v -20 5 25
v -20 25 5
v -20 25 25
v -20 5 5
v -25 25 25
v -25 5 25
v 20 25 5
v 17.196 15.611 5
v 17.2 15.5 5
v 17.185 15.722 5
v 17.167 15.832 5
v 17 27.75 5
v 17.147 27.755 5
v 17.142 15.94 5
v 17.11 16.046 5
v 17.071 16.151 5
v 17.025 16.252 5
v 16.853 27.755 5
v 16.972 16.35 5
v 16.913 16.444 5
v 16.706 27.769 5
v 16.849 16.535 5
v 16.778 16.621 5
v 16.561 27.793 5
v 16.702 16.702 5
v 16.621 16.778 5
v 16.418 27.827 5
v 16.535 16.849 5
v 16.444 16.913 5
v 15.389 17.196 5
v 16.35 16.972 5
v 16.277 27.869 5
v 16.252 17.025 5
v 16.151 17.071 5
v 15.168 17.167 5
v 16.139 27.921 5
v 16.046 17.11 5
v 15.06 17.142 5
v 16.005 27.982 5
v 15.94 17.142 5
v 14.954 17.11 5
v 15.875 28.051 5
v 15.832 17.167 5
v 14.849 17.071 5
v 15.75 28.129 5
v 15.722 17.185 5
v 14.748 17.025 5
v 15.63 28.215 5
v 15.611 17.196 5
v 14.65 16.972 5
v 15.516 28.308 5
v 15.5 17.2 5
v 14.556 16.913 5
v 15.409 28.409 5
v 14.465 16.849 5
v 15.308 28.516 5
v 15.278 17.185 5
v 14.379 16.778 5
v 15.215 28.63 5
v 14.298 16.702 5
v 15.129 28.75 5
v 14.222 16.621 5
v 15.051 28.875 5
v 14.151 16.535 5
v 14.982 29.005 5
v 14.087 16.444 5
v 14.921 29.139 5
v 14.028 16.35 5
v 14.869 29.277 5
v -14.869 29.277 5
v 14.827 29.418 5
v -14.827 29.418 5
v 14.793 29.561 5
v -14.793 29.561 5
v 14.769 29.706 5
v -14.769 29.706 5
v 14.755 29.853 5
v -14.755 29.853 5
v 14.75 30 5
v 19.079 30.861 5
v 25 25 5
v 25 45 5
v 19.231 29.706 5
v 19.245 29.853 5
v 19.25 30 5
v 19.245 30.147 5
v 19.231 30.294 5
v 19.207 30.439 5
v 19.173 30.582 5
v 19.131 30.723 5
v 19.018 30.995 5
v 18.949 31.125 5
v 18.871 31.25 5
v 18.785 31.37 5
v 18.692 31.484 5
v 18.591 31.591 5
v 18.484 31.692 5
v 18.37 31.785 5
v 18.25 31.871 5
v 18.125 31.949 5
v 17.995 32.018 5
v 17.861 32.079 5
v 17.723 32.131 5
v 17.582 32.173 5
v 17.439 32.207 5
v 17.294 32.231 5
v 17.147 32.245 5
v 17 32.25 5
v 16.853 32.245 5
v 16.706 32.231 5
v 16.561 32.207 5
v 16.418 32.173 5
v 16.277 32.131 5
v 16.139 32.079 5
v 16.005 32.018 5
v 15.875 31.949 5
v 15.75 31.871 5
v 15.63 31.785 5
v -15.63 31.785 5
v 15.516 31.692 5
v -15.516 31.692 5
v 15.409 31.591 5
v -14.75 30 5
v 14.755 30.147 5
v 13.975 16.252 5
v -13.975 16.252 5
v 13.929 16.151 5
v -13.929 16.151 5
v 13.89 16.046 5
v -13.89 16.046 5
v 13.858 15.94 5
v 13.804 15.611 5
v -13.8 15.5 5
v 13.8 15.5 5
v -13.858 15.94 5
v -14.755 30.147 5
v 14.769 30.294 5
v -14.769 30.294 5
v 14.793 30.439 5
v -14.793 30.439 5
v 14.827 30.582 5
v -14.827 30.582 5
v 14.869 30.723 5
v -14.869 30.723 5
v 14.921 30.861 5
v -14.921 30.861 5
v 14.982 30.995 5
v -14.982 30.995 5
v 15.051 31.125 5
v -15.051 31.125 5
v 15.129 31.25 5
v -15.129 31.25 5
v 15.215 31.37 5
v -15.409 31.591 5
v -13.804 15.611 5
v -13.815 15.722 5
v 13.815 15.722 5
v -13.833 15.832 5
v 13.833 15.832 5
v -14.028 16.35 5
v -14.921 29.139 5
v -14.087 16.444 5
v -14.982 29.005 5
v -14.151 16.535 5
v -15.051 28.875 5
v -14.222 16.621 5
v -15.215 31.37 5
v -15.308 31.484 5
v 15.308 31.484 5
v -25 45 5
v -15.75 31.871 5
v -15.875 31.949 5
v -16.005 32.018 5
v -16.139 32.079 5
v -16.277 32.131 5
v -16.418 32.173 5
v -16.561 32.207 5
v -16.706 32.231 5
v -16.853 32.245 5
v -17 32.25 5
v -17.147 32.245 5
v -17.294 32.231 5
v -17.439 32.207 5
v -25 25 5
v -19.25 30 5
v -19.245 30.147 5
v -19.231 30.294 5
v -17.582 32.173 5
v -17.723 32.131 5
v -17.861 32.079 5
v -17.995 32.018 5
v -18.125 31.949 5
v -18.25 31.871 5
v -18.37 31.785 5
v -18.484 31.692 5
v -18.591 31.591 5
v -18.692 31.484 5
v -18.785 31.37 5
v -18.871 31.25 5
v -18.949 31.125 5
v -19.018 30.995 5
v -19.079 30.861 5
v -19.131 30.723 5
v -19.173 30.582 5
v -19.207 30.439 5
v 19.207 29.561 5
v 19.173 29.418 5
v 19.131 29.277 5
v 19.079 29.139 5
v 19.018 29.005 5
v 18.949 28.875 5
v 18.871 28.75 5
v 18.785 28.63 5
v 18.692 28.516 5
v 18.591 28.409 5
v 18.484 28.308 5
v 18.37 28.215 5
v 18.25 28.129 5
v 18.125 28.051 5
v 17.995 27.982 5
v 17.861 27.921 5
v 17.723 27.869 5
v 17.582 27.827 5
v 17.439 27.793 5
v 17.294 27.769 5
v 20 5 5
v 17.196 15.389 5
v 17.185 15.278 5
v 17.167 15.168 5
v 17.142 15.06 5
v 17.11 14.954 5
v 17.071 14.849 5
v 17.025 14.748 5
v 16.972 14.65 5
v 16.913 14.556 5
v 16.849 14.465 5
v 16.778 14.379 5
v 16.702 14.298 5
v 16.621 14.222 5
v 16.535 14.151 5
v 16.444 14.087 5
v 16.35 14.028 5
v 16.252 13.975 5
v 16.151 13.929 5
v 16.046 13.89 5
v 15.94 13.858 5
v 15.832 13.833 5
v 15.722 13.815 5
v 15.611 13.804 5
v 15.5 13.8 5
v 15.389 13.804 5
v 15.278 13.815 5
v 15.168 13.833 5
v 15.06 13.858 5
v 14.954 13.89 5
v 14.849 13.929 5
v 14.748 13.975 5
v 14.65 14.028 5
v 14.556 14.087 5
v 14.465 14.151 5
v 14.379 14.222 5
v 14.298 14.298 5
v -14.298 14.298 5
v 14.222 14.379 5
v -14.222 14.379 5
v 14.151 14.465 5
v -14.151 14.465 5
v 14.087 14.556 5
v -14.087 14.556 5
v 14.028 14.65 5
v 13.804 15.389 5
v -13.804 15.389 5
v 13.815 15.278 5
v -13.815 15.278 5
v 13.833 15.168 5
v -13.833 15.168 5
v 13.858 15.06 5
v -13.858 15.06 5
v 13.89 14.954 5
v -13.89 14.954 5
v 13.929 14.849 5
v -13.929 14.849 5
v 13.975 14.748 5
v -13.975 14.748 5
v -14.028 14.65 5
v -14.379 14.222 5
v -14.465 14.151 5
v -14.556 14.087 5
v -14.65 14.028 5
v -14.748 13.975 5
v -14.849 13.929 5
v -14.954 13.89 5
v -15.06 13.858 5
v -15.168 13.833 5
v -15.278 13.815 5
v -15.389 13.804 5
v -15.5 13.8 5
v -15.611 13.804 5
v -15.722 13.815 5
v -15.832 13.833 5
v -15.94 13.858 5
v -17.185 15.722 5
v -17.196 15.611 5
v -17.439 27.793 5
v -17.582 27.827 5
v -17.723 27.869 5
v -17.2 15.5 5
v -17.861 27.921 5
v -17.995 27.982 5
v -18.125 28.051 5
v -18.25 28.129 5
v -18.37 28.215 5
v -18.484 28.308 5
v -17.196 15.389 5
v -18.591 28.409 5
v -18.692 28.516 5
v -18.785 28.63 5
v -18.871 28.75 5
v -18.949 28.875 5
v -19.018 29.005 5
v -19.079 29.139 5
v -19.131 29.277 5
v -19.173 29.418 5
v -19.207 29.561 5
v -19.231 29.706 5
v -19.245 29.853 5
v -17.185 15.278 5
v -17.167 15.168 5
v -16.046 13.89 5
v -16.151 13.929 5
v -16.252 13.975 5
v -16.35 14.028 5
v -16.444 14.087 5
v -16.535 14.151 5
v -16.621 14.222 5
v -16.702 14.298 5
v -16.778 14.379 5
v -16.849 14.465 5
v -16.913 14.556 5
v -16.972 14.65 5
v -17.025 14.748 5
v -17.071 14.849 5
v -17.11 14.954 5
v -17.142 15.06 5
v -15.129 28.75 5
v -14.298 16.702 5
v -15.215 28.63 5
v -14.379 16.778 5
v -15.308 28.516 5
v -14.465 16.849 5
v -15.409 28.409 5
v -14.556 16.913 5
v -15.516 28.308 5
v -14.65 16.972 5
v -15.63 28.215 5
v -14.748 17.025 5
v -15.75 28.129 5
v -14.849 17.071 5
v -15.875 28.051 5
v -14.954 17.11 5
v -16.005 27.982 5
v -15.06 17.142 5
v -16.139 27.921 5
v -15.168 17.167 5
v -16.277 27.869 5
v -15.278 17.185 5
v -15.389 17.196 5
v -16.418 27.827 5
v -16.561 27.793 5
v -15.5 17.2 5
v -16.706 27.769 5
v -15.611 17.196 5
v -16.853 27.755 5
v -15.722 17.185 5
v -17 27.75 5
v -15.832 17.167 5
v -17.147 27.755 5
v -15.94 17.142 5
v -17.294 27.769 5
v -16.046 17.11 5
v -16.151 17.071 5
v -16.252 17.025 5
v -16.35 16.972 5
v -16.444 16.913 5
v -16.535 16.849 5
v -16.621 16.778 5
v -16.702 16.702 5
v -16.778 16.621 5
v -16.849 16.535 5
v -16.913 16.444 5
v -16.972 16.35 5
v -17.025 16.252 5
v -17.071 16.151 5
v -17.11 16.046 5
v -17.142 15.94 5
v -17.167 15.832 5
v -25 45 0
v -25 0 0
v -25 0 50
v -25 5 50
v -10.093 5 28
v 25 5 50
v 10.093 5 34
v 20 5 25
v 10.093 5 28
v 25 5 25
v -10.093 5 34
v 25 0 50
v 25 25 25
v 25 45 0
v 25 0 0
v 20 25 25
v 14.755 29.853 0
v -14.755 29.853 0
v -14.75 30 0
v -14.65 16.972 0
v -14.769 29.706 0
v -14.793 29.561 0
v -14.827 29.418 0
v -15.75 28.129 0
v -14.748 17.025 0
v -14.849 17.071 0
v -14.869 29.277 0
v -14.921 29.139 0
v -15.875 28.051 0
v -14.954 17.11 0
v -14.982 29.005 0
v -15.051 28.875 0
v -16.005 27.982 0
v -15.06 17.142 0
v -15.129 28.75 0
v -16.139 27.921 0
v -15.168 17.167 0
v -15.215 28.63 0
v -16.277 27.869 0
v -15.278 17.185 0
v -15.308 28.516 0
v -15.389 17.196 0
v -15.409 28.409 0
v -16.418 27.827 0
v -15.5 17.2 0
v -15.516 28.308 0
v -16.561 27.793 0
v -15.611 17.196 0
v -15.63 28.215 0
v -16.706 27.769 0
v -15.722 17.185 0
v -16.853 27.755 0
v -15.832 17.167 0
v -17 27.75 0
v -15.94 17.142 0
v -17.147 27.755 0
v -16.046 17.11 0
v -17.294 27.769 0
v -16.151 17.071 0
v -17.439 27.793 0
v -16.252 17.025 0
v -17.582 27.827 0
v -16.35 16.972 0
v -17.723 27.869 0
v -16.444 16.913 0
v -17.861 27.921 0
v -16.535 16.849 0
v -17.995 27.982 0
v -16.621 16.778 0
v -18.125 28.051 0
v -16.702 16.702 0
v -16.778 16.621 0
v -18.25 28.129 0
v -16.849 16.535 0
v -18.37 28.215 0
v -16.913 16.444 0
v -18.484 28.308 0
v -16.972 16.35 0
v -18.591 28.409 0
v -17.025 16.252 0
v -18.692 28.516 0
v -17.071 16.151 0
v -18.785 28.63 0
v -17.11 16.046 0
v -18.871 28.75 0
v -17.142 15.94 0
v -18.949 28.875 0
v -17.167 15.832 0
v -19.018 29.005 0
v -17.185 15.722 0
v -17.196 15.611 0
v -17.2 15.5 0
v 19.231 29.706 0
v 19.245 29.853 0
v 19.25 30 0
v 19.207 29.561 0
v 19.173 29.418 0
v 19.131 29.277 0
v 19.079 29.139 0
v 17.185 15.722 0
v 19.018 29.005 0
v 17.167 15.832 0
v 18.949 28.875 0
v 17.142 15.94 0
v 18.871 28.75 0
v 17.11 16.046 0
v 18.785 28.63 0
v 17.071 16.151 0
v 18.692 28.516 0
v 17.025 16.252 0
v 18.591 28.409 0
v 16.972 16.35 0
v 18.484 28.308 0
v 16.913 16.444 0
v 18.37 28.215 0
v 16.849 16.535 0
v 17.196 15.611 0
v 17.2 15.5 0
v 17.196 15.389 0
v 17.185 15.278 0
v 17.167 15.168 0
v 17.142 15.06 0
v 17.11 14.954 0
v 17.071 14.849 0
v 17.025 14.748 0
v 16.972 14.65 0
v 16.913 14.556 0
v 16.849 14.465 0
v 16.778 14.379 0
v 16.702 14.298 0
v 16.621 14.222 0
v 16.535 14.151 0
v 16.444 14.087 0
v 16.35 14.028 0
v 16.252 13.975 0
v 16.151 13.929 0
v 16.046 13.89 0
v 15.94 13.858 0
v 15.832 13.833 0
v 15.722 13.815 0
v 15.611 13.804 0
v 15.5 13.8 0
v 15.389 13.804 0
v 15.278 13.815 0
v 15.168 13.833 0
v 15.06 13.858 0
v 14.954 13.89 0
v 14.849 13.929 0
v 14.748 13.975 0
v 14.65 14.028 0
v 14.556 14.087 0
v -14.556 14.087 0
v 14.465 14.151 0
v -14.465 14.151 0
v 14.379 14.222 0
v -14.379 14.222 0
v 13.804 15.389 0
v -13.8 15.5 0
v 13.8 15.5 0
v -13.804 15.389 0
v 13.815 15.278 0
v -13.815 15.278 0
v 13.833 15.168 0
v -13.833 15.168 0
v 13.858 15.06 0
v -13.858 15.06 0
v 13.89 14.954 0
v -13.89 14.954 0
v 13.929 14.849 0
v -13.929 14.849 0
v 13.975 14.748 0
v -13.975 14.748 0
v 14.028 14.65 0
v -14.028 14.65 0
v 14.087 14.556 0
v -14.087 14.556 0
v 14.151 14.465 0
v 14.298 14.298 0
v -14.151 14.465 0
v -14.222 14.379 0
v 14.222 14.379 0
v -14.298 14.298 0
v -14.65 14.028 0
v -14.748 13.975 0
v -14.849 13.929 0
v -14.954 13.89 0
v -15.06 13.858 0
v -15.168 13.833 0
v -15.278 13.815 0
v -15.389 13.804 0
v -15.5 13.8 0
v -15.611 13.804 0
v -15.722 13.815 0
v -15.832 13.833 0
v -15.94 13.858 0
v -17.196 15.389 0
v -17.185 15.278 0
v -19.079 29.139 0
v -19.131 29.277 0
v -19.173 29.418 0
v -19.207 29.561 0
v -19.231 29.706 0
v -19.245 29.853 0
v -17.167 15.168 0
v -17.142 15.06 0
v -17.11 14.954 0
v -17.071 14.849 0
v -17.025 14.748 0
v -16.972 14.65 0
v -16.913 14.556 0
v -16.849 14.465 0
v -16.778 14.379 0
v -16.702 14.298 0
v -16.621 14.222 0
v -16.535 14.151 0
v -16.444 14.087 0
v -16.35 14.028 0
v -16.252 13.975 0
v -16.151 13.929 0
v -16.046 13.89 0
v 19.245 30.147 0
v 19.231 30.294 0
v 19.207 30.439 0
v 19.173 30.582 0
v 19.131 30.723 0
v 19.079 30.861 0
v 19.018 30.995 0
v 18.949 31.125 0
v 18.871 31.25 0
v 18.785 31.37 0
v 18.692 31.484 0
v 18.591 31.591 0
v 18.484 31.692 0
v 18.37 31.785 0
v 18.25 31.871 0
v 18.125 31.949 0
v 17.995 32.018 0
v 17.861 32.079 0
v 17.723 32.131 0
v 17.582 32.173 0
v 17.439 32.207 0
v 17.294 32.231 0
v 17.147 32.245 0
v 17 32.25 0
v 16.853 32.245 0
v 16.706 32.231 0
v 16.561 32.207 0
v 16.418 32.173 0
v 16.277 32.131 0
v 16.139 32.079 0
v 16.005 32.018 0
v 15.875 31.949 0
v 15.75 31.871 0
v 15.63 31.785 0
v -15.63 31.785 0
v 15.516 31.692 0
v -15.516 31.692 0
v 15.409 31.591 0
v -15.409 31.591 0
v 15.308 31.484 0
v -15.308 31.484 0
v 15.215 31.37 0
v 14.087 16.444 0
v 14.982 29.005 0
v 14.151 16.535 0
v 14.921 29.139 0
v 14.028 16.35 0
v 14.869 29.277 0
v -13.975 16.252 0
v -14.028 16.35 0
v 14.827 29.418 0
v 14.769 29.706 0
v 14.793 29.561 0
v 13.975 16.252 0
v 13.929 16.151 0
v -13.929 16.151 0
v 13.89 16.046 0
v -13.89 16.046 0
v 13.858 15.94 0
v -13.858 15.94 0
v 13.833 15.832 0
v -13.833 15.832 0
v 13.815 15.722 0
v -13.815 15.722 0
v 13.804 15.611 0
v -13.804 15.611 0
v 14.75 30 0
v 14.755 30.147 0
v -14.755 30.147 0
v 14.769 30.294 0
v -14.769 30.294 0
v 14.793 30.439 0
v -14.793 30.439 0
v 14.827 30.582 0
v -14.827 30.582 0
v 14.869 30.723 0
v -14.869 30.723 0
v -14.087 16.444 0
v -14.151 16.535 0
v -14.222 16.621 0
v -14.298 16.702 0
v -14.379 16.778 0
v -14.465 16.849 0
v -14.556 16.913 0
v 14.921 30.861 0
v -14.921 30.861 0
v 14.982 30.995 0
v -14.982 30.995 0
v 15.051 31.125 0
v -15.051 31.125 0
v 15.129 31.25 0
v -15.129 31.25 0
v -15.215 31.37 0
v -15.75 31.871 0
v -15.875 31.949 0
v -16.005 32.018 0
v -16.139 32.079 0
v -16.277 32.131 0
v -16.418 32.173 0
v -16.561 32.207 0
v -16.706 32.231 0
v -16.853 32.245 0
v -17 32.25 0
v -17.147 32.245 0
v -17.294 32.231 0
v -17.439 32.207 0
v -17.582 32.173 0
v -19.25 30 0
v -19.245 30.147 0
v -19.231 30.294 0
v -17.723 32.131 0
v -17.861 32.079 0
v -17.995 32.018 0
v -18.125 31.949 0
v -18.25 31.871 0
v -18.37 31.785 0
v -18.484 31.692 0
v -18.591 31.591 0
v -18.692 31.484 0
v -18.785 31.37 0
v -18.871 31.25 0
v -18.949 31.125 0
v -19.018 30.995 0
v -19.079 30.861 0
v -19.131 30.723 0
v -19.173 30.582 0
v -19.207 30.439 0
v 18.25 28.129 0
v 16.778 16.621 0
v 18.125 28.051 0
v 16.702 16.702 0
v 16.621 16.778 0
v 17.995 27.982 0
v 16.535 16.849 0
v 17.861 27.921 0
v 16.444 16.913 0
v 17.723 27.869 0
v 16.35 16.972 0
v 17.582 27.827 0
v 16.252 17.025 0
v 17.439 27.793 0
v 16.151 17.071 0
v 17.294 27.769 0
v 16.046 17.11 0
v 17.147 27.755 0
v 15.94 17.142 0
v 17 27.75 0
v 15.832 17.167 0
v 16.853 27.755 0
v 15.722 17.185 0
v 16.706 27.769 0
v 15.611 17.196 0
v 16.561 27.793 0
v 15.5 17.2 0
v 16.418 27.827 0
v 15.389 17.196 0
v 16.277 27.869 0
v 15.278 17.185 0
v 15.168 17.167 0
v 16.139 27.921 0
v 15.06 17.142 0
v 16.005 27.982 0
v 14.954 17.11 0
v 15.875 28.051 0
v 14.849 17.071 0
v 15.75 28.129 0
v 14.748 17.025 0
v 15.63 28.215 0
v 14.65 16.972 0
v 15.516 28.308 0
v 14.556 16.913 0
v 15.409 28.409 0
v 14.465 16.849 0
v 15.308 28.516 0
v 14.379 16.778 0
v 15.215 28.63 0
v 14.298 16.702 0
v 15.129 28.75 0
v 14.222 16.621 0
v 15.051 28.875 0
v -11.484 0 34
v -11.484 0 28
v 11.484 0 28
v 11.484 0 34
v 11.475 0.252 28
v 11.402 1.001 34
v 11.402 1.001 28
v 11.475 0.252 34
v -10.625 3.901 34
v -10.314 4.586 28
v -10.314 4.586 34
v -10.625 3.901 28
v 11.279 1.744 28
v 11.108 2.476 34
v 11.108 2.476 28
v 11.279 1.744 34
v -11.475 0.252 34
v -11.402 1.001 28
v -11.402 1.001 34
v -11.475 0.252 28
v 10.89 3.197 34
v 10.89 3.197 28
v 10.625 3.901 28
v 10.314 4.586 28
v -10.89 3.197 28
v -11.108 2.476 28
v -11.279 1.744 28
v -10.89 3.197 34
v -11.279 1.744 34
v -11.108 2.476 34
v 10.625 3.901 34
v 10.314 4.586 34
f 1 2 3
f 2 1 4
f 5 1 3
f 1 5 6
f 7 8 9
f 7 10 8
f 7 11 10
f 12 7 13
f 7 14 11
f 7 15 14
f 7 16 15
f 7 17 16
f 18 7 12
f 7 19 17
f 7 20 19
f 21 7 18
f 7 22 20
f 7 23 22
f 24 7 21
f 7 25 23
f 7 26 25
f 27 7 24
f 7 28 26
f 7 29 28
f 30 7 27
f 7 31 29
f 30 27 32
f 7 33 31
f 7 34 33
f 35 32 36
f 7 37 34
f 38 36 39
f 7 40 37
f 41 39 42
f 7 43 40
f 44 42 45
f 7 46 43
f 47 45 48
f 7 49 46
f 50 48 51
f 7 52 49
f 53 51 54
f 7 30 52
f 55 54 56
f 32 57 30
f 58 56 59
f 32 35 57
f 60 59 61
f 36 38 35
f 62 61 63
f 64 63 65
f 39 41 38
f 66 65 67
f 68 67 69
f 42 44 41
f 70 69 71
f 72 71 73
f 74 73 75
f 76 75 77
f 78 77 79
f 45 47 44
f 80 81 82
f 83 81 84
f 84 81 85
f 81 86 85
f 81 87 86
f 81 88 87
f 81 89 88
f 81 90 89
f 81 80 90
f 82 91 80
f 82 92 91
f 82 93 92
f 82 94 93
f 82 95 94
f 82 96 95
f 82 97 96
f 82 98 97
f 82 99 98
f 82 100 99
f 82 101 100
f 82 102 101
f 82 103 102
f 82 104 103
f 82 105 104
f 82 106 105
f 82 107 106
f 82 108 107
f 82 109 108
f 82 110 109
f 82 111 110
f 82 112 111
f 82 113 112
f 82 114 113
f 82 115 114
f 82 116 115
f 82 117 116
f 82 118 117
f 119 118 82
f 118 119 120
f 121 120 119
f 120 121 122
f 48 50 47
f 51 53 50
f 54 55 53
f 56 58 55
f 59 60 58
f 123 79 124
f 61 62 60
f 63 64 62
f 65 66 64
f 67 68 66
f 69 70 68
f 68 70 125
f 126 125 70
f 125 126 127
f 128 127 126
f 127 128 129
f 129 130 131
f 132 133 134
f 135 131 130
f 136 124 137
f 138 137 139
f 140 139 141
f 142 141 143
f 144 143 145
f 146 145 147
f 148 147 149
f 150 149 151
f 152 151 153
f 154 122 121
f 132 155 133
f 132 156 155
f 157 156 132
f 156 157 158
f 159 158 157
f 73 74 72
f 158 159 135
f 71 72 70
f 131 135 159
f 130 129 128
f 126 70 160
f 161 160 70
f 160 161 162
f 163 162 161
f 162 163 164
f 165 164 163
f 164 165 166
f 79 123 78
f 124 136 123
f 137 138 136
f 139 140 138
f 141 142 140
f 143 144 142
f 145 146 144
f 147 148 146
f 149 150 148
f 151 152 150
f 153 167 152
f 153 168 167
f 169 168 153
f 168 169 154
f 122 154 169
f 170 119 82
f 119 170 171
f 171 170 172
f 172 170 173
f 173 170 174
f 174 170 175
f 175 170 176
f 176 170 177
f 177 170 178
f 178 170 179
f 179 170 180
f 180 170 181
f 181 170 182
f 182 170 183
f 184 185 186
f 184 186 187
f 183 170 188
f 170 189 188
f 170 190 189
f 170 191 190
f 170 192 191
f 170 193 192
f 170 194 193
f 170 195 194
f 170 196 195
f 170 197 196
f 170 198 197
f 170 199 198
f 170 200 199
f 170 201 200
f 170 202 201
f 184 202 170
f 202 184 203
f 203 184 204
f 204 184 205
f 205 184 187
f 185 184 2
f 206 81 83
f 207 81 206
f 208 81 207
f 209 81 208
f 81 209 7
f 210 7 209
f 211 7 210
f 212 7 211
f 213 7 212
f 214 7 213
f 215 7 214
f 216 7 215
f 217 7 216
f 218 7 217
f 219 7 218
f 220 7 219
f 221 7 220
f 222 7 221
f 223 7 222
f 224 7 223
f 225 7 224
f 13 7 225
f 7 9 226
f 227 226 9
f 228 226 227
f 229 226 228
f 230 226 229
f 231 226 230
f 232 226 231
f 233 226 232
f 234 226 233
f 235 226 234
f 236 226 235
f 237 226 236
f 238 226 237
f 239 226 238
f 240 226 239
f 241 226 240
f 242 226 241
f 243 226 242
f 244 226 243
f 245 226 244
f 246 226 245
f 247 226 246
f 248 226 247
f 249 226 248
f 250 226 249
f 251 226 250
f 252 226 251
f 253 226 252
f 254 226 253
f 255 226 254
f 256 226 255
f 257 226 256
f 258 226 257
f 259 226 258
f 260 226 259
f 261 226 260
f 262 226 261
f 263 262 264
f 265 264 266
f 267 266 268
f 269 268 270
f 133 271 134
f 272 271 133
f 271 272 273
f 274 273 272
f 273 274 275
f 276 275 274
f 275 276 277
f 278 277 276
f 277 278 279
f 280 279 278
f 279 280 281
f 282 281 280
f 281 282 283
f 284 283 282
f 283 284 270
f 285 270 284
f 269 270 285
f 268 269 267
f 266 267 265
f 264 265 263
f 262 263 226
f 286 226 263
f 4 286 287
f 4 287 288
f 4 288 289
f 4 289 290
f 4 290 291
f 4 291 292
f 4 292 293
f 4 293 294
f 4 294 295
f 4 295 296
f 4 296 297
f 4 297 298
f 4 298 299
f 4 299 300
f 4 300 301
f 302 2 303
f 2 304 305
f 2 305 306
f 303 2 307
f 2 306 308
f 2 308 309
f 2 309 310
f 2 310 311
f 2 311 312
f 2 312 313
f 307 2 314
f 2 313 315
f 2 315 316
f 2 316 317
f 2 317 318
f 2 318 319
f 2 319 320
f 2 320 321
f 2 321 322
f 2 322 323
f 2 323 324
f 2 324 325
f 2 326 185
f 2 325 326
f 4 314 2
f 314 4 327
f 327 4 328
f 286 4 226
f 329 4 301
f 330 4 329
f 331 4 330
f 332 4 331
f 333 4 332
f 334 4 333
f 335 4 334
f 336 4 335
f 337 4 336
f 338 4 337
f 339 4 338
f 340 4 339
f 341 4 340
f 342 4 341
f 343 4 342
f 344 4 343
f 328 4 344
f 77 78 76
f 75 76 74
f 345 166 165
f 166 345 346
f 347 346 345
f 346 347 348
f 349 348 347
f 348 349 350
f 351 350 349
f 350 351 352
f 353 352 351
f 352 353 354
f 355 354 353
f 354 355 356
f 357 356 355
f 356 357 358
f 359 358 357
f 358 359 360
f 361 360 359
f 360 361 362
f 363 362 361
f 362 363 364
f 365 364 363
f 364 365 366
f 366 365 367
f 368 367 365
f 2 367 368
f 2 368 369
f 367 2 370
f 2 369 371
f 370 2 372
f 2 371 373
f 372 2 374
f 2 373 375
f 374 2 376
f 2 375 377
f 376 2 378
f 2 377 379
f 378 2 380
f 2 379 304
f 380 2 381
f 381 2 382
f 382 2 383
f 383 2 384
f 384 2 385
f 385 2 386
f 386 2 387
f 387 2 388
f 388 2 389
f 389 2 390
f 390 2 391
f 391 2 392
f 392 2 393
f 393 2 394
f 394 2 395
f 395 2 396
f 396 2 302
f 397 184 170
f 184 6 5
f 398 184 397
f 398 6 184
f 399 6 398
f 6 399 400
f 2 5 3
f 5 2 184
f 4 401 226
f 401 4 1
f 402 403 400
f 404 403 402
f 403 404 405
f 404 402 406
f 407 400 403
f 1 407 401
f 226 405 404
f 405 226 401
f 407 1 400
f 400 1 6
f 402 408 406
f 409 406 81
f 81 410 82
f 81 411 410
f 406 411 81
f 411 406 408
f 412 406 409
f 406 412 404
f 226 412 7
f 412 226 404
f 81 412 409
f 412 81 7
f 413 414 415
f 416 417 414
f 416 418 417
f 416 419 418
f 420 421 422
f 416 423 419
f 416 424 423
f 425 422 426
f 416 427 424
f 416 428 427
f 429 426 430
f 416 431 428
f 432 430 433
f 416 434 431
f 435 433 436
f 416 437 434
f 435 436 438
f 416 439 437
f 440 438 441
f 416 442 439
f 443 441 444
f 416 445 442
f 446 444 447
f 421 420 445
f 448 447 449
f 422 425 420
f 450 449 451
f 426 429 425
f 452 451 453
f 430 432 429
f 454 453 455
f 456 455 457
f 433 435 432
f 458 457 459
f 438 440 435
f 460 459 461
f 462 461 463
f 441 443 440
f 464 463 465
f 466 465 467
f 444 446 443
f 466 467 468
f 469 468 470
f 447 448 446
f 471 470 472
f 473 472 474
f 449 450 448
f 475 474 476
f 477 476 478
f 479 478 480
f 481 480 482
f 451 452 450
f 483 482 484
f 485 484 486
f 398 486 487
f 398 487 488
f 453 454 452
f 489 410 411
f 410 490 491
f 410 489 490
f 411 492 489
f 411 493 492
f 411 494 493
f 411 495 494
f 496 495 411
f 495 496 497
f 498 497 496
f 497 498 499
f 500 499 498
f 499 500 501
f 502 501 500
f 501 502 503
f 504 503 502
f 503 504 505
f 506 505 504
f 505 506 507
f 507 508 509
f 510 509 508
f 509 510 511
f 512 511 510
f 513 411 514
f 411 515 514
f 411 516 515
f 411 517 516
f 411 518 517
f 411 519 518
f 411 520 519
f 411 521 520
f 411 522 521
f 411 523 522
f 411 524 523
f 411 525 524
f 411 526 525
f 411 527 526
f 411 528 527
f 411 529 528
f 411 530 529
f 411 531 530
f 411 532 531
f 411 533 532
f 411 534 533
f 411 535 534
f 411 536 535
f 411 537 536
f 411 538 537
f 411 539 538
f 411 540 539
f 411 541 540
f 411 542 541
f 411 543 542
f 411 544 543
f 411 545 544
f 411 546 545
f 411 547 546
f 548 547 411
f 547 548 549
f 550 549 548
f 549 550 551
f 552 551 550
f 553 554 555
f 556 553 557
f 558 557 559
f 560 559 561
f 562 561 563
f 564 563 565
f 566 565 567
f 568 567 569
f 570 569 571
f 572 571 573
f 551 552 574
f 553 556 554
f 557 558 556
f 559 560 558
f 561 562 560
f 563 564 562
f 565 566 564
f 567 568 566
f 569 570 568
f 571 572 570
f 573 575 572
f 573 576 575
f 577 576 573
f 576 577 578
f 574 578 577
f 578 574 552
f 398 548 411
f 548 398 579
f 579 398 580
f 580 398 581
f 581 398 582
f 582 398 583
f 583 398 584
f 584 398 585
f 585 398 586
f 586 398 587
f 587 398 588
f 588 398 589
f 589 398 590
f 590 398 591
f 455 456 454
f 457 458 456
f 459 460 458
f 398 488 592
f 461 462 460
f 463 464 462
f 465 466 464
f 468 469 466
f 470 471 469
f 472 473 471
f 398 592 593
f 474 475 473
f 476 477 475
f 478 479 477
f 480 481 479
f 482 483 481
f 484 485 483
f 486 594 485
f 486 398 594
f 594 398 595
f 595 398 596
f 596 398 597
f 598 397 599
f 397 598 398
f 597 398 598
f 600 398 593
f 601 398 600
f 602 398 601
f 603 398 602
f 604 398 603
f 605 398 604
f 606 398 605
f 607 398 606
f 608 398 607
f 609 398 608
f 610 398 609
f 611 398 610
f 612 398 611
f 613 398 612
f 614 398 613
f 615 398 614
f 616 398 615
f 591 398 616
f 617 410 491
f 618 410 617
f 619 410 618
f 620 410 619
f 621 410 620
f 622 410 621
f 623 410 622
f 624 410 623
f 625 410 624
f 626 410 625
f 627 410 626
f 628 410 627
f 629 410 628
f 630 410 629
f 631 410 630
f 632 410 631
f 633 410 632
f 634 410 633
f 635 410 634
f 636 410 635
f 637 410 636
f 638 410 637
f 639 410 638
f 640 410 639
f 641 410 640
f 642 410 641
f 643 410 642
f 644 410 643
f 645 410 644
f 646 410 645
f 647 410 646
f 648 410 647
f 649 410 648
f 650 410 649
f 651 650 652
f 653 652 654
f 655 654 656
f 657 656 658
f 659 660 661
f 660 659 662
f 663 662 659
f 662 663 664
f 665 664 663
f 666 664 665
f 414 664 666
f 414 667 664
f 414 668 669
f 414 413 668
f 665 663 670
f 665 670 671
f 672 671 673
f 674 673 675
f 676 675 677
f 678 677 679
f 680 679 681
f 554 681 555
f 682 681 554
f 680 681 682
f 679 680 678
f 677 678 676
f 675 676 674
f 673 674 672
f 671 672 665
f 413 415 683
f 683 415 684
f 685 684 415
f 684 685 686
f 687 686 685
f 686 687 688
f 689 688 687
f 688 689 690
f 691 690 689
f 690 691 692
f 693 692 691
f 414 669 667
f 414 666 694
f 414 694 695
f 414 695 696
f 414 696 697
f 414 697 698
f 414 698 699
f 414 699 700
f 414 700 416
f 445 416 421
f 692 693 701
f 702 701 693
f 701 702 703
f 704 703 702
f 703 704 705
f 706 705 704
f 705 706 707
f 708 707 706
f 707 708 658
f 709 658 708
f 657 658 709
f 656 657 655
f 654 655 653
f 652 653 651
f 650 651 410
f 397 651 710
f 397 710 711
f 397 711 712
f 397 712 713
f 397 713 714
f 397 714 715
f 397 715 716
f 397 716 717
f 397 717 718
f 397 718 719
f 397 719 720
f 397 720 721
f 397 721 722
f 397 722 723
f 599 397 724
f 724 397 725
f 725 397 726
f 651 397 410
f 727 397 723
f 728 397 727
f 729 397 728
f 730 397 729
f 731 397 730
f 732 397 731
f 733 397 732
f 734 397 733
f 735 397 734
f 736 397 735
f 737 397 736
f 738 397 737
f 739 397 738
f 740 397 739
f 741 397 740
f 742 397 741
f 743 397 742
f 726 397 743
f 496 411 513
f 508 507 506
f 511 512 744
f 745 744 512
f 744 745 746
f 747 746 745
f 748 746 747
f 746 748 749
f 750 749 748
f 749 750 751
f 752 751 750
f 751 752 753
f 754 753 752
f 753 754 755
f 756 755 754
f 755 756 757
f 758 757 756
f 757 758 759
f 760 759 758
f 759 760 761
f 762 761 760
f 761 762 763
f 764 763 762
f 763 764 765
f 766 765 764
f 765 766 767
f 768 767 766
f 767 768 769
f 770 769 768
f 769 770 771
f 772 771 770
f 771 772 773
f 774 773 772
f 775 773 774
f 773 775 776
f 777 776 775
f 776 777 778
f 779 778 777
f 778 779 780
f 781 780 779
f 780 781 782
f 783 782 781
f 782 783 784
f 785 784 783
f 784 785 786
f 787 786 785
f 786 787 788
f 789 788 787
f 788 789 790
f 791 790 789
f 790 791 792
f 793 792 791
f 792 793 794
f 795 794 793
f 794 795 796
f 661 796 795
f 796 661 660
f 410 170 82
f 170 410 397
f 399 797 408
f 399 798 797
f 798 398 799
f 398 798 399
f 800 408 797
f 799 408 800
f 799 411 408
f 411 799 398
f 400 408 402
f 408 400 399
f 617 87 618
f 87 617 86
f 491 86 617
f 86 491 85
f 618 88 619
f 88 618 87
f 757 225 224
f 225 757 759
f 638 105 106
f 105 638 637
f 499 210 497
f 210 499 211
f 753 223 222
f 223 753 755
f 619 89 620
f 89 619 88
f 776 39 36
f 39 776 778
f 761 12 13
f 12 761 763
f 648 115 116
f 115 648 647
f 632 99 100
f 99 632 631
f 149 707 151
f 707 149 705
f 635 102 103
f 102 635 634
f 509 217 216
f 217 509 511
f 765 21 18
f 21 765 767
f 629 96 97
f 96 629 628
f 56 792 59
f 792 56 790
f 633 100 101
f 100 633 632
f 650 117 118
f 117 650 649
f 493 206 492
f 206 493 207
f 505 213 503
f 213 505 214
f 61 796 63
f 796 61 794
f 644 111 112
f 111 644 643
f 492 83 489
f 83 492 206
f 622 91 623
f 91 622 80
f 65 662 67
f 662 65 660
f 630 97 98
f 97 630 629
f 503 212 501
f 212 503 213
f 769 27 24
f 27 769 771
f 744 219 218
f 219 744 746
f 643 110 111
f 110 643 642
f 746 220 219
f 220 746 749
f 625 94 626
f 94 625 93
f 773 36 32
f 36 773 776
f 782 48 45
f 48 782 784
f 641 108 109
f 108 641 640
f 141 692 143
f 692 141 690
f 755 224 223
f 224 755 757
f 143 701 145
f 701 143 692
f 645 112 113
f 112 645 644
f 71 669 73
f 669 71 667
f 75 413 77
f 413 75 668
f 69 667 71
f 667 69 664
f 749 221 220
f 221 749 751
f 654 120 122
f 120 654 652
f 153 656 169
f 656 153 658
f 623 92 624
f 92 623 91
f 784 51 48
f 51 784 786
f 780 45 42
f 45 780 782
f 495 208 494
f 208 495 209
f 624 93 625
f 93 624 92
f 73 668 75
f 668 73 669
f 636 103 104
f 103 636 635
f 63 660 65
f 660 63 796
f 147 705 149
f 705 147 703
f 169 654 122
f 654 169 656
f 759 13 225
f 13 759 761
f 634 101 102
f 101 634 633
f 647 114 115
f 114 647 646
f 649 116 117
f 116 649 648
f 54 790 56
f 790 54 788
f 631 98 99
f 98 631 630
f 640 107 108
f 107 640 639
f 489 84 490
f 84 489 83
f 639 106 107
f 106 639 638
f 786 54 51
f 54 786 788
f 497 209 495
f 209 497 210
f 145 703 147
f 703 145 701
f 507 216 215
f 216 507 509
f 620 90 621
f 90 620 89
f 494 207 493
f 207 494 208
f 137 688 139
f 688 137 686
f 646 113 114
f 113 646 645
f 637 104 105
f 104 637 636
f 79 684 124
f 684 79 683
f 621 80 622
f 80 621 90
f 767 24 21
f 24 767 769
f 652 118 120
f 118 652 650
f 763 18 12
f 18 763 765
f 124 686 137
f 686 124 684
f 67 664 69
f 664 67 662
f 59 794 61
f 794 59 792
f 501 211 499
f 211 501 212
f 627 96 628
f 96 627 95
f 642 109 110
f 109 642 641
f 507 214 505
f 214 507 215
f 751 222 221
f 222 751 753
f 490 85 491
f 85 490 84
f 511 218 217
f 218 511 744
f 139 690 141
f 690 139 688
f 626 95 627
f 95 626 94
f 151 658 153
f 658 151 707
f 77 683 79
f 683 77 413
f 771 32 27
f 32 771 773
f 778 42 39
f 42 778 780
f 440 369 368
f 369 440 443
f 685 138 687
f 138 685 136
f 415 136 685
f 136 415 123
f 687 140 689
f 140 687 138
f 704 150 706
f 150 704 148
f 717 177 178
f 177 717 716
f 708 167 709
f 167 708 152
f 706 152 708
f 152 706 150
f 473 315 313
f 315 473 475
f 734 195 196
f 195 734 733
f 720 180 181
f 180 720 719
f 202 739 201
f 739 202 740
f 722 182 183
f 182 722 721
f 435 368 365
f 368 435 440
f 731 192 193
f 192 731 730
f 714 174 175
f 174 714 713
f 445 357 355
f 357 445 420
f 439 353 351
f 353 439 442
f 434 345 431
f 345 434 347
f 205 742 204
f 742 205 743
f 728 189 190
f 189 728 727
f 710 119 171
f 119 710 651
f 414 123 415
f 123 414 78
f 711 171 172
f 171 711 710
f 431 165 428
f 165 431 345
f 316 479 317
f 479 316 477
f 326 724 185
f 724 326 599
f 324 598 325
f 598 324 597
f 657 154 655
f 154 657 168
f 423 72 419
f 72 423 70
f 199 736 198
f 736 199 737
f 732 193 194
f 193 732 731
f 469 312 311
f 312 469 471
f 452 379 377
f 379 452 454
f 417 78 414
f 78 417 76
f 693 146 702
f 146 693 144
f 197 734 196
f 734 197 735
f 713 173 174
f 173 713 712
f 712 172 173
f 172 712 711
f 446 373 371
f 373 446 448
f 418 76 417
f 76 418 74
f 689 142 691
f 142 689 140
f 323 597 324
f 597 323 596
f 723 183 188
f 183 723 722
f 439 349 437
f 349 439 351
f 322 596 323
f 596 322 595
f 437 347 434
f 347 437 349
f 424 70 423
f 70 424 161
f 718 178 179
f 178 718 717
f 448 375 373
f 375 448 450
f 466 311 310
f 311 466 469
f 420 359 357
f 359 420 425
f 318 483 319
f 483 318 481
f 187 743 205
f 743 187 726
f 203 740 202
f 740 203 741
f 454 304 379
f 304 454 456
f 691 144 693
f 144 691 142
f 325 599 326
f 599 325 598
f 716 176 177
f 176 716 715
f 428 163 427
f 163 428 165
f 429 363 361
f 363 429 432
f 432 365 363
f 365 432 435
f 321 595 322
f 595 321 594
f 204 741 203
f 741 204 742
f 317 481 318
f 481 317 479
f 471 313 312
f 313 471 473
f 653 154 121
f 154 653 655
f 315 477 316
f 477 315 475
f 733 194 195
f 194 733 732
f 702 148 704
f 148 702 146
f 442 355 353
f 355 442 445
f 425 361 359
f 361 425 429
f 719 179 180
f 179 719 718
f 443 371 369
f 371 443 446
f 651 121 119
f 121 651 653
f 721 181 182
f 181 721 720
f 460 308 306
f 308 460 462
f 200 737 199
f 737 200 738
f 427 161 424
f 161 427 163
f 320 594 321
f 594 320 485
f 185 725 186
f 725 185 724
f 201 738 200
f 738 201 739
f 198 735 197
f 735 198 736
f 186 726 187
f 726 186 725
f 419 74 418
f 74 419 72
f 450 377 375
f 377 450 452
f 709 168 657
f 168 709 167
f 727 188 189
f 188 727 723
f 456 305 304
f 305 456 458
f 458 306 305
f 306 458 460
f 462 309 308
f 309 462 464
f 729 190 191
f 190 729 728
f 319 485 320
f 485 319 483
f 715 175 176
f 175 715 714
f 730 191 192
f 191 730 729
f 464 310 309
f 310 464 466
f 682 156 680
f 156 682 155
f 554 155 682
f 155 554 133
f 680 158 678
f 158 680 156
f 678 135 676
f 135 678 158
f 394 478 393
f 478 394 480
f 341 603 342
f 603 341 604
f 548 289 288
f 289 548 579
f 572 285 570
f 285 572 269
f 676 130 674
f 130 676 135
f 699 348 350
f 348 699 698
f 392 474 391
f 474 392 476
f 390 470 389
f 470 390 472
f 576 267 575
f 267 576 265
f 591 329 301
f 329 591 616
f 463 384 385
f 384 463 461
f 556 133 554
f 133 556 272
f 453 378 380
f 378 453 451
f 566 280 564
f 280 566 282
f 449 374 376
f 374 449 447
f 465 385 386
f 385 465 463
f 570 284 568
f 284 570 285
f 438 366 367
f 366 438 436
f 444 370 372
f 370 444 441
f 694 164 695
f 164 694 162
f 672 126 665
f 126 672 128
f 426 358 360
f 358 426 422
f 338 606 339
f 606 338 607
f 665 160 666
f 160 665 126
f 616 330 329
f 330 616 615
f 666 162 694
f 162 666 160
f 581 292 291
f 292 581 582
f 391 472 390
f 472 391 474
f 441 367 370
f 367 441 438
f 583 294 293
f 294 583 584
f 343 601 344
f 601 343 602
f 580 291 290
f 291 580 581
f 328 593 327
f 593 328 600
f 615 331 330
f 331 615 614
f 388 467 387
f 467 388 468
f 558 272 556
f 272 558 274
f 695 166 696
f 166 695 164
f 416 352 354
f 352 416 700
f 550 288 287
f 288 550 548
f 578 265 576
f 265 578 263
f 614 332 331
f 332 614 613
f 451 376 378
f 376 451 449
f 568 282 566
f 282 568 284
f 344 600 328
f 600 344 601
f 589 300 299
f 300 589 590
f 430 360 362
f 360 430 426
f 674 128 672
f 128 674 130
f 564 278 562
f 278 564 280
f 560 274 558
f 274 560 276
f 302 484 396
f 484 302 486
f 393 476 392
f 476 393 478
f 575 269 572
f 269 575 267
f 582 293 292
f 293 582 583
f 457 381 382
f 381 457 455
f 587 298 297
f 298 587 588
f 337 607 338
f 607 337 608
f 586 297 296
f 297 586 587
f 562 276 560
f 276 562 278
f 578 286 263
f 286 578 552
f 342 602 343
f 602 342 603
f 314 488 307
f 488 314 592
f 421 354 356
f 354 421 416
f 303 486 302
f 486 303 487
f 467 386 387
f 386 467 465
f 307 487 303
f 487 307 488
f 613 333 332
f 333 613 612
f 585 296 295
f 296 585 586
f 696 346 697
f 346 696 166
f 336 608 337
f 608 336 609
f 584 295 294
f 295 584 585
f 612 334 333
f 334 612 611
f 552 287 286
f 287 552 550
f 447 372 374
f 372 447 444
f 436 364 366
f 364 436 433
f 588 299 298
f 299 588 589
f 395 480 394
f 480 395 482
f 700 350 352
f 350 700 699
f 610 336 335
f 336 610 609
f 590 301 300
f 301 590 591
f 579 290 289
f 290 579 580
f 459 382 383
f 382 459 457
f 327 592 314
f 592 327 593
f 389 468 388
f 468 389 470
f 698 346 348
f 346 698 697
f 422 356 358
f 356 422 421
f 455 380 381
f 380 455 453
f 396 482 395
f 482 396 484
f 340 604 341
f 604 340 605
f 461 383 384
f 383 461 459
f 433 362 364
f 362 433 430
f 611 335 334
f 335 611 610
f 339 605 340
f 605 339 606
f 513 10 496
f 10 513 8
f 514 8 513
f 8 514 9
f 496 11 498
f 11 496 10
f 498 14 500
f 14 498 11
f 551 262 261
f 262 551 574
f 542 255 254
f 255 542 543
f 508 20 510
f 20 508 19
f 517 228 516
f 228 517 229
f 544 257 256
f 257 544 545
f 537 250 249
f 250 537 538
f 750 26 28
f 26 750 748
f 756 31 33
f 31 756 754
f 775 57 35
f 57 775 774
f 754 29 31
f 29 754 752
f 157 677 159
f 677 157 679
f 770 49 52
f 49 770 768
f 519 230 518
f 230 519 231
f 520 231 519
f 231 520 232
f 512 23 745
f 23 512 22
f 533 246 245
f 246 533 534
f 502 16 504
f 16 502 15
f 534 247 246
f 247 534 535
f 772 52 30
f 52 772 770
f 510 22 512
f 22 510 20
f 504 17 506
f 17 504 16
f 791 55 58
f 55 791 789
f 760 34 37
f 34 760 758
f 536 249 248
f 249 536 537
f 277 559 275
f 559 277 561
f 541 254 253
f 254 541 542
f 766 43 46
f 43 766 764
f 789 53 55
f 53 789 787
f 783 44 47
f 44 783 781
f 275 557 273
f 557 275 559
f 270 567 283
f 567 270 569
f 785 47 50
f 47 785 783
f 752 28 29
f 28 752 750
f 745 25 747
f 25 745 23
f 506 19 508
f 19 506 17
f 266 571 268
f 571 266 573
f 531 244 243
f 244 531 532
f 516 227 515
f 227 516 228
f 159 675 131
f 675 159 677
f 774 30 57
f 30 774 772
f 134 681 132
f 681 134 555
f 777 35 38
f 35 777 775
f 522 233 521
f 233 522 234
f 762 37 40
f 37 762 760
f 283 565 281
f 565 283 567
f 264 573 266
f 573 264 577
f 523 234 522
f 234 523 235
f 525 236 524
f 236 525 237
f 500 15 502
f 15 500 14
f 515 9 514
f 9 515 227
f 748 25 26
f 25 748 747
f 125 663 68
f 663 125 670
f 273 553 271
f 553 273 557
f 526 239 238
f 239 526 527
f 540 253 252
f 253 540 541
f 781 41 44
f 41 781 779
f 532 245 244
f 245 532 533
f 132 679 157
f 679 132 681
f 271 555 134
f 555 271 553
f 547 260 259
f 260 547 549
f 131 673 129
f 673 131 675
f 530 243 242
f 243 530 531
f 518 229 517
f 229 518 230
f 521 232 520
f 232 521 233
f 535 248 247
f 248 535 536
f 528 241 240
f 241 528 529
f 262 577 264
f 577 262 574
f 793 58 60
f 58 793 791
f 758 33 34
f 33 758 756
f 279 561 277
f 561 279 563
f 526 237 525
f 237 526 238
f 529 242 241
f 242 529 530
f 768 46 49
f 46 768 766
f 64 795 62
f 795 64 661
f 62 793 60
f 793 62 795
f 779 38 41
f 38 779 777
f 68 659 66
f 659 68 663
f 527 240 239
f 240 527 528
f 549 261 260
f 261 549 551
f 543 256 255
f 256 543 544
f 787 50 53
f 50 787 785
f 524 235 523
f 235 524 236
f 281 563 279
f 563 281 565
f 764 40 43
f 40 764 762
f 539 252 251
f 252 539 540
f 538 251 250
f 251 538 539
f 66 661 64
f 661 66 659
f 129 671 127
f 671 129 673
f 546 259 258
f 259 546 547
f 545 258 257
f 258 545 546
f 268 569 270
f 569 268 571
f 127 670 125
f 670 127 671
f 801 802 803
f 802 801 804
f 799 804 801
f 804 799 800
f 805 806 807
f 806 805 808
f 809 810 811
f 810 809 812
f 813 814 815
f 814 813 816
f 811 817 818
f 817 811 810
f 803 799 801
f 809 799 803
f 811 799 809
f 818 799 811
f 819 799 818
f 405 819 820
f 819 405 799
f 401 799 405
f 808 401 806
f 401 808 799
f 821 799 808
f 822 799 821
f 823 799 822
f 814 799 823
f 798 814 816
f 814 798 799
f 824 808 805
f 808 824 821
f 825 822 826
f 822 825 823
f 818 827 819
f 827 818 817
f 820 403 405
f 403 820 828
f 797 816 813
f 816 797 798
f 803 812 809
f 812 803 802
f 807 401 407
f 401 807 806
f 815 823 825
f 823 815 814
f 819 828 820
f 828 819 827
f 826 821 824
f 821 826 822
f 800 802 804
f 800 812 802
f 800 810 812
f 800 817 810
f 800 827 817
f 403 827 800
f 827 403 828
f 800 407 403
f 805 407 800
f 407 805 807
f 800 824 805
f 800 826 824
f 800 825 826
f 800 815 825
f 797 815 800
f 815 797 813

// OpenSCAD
// L-shaped mounting bracket for NEMA 17 stepper motor
// Print orientation: base plate on bed, motor plate building up in +Z

// ---------- Parameters ----------
base_x      = 25;    // base plate half-length in X
base_y      = 45;    // base plate length in Y
base_z      = 5;     // base plate thickness in Z

hole_m4_x   = -17;   // M4 through-hole X offset (both holes)
hole_m4_y   = 30;    // M4 through-hole Y position

motor_hole  = 23;    // motor boss through-hole diameter
motor_hole_x = 0;    // motor boss hole X centre
motor_hole_z = 28;   // motor boss hole Z centre

screw_hole  = 3.4;   // M3 screw hole diameter
screw_pitch = 31;    // square pattern side length for screw holes

gusset_t    = 5;     // gusset thickness (in X)
gusset_leg  = 20;    // right-triangle leg length (Y and Z)

eps         = 0.5;   // cutter overshoot past faces

$fn = 96;            // curve resolution

// ---------- Model ----------
difference() {
    union() {
        // Base plate
        translate([-base_x, 0, 0])
            cube([2 * base_x, base_y, base_z]);

        // Vertical motor plate (on back edge of base)
        translate([-base_x, 0, 0])
            cube([2 * base_x, 5, 50]);

        // Gussets, flush with left and right edges
        for (sx = [-1, 1])
            translate([sx > 0 ? 20 : -25, 5, 5])
                cube([gusset_t, gusset_leg, gusset_leg]);
    }

    // M4 through-holes
    for (mx = [-1, 1])
        translate([mx * hole_m4_x, hole_m4_y, -eps])
            cylinder(d = 4.5, h = base_z + 50 + 2 * eps);

    // Motor boss through-hole (along Y)
    translate([motor_hole_x, -eps, motor_hole_z])
        cylinder(d = motor_hole, h = 5 + 2 * eps);

    // M3 screw holes on square pattern, centred on boss hole
    for (a = [0, 90, 180, 270])
        rotate([0, 0, a])
            for (sx = [-1, 1], sy = [-1, 1])
                translate([sx * screw_pitch / 2, sy * screw_pitch / 2, -eps])
                    cylinder(d = screw_hole, h = 50 + 2 * eps);
}
